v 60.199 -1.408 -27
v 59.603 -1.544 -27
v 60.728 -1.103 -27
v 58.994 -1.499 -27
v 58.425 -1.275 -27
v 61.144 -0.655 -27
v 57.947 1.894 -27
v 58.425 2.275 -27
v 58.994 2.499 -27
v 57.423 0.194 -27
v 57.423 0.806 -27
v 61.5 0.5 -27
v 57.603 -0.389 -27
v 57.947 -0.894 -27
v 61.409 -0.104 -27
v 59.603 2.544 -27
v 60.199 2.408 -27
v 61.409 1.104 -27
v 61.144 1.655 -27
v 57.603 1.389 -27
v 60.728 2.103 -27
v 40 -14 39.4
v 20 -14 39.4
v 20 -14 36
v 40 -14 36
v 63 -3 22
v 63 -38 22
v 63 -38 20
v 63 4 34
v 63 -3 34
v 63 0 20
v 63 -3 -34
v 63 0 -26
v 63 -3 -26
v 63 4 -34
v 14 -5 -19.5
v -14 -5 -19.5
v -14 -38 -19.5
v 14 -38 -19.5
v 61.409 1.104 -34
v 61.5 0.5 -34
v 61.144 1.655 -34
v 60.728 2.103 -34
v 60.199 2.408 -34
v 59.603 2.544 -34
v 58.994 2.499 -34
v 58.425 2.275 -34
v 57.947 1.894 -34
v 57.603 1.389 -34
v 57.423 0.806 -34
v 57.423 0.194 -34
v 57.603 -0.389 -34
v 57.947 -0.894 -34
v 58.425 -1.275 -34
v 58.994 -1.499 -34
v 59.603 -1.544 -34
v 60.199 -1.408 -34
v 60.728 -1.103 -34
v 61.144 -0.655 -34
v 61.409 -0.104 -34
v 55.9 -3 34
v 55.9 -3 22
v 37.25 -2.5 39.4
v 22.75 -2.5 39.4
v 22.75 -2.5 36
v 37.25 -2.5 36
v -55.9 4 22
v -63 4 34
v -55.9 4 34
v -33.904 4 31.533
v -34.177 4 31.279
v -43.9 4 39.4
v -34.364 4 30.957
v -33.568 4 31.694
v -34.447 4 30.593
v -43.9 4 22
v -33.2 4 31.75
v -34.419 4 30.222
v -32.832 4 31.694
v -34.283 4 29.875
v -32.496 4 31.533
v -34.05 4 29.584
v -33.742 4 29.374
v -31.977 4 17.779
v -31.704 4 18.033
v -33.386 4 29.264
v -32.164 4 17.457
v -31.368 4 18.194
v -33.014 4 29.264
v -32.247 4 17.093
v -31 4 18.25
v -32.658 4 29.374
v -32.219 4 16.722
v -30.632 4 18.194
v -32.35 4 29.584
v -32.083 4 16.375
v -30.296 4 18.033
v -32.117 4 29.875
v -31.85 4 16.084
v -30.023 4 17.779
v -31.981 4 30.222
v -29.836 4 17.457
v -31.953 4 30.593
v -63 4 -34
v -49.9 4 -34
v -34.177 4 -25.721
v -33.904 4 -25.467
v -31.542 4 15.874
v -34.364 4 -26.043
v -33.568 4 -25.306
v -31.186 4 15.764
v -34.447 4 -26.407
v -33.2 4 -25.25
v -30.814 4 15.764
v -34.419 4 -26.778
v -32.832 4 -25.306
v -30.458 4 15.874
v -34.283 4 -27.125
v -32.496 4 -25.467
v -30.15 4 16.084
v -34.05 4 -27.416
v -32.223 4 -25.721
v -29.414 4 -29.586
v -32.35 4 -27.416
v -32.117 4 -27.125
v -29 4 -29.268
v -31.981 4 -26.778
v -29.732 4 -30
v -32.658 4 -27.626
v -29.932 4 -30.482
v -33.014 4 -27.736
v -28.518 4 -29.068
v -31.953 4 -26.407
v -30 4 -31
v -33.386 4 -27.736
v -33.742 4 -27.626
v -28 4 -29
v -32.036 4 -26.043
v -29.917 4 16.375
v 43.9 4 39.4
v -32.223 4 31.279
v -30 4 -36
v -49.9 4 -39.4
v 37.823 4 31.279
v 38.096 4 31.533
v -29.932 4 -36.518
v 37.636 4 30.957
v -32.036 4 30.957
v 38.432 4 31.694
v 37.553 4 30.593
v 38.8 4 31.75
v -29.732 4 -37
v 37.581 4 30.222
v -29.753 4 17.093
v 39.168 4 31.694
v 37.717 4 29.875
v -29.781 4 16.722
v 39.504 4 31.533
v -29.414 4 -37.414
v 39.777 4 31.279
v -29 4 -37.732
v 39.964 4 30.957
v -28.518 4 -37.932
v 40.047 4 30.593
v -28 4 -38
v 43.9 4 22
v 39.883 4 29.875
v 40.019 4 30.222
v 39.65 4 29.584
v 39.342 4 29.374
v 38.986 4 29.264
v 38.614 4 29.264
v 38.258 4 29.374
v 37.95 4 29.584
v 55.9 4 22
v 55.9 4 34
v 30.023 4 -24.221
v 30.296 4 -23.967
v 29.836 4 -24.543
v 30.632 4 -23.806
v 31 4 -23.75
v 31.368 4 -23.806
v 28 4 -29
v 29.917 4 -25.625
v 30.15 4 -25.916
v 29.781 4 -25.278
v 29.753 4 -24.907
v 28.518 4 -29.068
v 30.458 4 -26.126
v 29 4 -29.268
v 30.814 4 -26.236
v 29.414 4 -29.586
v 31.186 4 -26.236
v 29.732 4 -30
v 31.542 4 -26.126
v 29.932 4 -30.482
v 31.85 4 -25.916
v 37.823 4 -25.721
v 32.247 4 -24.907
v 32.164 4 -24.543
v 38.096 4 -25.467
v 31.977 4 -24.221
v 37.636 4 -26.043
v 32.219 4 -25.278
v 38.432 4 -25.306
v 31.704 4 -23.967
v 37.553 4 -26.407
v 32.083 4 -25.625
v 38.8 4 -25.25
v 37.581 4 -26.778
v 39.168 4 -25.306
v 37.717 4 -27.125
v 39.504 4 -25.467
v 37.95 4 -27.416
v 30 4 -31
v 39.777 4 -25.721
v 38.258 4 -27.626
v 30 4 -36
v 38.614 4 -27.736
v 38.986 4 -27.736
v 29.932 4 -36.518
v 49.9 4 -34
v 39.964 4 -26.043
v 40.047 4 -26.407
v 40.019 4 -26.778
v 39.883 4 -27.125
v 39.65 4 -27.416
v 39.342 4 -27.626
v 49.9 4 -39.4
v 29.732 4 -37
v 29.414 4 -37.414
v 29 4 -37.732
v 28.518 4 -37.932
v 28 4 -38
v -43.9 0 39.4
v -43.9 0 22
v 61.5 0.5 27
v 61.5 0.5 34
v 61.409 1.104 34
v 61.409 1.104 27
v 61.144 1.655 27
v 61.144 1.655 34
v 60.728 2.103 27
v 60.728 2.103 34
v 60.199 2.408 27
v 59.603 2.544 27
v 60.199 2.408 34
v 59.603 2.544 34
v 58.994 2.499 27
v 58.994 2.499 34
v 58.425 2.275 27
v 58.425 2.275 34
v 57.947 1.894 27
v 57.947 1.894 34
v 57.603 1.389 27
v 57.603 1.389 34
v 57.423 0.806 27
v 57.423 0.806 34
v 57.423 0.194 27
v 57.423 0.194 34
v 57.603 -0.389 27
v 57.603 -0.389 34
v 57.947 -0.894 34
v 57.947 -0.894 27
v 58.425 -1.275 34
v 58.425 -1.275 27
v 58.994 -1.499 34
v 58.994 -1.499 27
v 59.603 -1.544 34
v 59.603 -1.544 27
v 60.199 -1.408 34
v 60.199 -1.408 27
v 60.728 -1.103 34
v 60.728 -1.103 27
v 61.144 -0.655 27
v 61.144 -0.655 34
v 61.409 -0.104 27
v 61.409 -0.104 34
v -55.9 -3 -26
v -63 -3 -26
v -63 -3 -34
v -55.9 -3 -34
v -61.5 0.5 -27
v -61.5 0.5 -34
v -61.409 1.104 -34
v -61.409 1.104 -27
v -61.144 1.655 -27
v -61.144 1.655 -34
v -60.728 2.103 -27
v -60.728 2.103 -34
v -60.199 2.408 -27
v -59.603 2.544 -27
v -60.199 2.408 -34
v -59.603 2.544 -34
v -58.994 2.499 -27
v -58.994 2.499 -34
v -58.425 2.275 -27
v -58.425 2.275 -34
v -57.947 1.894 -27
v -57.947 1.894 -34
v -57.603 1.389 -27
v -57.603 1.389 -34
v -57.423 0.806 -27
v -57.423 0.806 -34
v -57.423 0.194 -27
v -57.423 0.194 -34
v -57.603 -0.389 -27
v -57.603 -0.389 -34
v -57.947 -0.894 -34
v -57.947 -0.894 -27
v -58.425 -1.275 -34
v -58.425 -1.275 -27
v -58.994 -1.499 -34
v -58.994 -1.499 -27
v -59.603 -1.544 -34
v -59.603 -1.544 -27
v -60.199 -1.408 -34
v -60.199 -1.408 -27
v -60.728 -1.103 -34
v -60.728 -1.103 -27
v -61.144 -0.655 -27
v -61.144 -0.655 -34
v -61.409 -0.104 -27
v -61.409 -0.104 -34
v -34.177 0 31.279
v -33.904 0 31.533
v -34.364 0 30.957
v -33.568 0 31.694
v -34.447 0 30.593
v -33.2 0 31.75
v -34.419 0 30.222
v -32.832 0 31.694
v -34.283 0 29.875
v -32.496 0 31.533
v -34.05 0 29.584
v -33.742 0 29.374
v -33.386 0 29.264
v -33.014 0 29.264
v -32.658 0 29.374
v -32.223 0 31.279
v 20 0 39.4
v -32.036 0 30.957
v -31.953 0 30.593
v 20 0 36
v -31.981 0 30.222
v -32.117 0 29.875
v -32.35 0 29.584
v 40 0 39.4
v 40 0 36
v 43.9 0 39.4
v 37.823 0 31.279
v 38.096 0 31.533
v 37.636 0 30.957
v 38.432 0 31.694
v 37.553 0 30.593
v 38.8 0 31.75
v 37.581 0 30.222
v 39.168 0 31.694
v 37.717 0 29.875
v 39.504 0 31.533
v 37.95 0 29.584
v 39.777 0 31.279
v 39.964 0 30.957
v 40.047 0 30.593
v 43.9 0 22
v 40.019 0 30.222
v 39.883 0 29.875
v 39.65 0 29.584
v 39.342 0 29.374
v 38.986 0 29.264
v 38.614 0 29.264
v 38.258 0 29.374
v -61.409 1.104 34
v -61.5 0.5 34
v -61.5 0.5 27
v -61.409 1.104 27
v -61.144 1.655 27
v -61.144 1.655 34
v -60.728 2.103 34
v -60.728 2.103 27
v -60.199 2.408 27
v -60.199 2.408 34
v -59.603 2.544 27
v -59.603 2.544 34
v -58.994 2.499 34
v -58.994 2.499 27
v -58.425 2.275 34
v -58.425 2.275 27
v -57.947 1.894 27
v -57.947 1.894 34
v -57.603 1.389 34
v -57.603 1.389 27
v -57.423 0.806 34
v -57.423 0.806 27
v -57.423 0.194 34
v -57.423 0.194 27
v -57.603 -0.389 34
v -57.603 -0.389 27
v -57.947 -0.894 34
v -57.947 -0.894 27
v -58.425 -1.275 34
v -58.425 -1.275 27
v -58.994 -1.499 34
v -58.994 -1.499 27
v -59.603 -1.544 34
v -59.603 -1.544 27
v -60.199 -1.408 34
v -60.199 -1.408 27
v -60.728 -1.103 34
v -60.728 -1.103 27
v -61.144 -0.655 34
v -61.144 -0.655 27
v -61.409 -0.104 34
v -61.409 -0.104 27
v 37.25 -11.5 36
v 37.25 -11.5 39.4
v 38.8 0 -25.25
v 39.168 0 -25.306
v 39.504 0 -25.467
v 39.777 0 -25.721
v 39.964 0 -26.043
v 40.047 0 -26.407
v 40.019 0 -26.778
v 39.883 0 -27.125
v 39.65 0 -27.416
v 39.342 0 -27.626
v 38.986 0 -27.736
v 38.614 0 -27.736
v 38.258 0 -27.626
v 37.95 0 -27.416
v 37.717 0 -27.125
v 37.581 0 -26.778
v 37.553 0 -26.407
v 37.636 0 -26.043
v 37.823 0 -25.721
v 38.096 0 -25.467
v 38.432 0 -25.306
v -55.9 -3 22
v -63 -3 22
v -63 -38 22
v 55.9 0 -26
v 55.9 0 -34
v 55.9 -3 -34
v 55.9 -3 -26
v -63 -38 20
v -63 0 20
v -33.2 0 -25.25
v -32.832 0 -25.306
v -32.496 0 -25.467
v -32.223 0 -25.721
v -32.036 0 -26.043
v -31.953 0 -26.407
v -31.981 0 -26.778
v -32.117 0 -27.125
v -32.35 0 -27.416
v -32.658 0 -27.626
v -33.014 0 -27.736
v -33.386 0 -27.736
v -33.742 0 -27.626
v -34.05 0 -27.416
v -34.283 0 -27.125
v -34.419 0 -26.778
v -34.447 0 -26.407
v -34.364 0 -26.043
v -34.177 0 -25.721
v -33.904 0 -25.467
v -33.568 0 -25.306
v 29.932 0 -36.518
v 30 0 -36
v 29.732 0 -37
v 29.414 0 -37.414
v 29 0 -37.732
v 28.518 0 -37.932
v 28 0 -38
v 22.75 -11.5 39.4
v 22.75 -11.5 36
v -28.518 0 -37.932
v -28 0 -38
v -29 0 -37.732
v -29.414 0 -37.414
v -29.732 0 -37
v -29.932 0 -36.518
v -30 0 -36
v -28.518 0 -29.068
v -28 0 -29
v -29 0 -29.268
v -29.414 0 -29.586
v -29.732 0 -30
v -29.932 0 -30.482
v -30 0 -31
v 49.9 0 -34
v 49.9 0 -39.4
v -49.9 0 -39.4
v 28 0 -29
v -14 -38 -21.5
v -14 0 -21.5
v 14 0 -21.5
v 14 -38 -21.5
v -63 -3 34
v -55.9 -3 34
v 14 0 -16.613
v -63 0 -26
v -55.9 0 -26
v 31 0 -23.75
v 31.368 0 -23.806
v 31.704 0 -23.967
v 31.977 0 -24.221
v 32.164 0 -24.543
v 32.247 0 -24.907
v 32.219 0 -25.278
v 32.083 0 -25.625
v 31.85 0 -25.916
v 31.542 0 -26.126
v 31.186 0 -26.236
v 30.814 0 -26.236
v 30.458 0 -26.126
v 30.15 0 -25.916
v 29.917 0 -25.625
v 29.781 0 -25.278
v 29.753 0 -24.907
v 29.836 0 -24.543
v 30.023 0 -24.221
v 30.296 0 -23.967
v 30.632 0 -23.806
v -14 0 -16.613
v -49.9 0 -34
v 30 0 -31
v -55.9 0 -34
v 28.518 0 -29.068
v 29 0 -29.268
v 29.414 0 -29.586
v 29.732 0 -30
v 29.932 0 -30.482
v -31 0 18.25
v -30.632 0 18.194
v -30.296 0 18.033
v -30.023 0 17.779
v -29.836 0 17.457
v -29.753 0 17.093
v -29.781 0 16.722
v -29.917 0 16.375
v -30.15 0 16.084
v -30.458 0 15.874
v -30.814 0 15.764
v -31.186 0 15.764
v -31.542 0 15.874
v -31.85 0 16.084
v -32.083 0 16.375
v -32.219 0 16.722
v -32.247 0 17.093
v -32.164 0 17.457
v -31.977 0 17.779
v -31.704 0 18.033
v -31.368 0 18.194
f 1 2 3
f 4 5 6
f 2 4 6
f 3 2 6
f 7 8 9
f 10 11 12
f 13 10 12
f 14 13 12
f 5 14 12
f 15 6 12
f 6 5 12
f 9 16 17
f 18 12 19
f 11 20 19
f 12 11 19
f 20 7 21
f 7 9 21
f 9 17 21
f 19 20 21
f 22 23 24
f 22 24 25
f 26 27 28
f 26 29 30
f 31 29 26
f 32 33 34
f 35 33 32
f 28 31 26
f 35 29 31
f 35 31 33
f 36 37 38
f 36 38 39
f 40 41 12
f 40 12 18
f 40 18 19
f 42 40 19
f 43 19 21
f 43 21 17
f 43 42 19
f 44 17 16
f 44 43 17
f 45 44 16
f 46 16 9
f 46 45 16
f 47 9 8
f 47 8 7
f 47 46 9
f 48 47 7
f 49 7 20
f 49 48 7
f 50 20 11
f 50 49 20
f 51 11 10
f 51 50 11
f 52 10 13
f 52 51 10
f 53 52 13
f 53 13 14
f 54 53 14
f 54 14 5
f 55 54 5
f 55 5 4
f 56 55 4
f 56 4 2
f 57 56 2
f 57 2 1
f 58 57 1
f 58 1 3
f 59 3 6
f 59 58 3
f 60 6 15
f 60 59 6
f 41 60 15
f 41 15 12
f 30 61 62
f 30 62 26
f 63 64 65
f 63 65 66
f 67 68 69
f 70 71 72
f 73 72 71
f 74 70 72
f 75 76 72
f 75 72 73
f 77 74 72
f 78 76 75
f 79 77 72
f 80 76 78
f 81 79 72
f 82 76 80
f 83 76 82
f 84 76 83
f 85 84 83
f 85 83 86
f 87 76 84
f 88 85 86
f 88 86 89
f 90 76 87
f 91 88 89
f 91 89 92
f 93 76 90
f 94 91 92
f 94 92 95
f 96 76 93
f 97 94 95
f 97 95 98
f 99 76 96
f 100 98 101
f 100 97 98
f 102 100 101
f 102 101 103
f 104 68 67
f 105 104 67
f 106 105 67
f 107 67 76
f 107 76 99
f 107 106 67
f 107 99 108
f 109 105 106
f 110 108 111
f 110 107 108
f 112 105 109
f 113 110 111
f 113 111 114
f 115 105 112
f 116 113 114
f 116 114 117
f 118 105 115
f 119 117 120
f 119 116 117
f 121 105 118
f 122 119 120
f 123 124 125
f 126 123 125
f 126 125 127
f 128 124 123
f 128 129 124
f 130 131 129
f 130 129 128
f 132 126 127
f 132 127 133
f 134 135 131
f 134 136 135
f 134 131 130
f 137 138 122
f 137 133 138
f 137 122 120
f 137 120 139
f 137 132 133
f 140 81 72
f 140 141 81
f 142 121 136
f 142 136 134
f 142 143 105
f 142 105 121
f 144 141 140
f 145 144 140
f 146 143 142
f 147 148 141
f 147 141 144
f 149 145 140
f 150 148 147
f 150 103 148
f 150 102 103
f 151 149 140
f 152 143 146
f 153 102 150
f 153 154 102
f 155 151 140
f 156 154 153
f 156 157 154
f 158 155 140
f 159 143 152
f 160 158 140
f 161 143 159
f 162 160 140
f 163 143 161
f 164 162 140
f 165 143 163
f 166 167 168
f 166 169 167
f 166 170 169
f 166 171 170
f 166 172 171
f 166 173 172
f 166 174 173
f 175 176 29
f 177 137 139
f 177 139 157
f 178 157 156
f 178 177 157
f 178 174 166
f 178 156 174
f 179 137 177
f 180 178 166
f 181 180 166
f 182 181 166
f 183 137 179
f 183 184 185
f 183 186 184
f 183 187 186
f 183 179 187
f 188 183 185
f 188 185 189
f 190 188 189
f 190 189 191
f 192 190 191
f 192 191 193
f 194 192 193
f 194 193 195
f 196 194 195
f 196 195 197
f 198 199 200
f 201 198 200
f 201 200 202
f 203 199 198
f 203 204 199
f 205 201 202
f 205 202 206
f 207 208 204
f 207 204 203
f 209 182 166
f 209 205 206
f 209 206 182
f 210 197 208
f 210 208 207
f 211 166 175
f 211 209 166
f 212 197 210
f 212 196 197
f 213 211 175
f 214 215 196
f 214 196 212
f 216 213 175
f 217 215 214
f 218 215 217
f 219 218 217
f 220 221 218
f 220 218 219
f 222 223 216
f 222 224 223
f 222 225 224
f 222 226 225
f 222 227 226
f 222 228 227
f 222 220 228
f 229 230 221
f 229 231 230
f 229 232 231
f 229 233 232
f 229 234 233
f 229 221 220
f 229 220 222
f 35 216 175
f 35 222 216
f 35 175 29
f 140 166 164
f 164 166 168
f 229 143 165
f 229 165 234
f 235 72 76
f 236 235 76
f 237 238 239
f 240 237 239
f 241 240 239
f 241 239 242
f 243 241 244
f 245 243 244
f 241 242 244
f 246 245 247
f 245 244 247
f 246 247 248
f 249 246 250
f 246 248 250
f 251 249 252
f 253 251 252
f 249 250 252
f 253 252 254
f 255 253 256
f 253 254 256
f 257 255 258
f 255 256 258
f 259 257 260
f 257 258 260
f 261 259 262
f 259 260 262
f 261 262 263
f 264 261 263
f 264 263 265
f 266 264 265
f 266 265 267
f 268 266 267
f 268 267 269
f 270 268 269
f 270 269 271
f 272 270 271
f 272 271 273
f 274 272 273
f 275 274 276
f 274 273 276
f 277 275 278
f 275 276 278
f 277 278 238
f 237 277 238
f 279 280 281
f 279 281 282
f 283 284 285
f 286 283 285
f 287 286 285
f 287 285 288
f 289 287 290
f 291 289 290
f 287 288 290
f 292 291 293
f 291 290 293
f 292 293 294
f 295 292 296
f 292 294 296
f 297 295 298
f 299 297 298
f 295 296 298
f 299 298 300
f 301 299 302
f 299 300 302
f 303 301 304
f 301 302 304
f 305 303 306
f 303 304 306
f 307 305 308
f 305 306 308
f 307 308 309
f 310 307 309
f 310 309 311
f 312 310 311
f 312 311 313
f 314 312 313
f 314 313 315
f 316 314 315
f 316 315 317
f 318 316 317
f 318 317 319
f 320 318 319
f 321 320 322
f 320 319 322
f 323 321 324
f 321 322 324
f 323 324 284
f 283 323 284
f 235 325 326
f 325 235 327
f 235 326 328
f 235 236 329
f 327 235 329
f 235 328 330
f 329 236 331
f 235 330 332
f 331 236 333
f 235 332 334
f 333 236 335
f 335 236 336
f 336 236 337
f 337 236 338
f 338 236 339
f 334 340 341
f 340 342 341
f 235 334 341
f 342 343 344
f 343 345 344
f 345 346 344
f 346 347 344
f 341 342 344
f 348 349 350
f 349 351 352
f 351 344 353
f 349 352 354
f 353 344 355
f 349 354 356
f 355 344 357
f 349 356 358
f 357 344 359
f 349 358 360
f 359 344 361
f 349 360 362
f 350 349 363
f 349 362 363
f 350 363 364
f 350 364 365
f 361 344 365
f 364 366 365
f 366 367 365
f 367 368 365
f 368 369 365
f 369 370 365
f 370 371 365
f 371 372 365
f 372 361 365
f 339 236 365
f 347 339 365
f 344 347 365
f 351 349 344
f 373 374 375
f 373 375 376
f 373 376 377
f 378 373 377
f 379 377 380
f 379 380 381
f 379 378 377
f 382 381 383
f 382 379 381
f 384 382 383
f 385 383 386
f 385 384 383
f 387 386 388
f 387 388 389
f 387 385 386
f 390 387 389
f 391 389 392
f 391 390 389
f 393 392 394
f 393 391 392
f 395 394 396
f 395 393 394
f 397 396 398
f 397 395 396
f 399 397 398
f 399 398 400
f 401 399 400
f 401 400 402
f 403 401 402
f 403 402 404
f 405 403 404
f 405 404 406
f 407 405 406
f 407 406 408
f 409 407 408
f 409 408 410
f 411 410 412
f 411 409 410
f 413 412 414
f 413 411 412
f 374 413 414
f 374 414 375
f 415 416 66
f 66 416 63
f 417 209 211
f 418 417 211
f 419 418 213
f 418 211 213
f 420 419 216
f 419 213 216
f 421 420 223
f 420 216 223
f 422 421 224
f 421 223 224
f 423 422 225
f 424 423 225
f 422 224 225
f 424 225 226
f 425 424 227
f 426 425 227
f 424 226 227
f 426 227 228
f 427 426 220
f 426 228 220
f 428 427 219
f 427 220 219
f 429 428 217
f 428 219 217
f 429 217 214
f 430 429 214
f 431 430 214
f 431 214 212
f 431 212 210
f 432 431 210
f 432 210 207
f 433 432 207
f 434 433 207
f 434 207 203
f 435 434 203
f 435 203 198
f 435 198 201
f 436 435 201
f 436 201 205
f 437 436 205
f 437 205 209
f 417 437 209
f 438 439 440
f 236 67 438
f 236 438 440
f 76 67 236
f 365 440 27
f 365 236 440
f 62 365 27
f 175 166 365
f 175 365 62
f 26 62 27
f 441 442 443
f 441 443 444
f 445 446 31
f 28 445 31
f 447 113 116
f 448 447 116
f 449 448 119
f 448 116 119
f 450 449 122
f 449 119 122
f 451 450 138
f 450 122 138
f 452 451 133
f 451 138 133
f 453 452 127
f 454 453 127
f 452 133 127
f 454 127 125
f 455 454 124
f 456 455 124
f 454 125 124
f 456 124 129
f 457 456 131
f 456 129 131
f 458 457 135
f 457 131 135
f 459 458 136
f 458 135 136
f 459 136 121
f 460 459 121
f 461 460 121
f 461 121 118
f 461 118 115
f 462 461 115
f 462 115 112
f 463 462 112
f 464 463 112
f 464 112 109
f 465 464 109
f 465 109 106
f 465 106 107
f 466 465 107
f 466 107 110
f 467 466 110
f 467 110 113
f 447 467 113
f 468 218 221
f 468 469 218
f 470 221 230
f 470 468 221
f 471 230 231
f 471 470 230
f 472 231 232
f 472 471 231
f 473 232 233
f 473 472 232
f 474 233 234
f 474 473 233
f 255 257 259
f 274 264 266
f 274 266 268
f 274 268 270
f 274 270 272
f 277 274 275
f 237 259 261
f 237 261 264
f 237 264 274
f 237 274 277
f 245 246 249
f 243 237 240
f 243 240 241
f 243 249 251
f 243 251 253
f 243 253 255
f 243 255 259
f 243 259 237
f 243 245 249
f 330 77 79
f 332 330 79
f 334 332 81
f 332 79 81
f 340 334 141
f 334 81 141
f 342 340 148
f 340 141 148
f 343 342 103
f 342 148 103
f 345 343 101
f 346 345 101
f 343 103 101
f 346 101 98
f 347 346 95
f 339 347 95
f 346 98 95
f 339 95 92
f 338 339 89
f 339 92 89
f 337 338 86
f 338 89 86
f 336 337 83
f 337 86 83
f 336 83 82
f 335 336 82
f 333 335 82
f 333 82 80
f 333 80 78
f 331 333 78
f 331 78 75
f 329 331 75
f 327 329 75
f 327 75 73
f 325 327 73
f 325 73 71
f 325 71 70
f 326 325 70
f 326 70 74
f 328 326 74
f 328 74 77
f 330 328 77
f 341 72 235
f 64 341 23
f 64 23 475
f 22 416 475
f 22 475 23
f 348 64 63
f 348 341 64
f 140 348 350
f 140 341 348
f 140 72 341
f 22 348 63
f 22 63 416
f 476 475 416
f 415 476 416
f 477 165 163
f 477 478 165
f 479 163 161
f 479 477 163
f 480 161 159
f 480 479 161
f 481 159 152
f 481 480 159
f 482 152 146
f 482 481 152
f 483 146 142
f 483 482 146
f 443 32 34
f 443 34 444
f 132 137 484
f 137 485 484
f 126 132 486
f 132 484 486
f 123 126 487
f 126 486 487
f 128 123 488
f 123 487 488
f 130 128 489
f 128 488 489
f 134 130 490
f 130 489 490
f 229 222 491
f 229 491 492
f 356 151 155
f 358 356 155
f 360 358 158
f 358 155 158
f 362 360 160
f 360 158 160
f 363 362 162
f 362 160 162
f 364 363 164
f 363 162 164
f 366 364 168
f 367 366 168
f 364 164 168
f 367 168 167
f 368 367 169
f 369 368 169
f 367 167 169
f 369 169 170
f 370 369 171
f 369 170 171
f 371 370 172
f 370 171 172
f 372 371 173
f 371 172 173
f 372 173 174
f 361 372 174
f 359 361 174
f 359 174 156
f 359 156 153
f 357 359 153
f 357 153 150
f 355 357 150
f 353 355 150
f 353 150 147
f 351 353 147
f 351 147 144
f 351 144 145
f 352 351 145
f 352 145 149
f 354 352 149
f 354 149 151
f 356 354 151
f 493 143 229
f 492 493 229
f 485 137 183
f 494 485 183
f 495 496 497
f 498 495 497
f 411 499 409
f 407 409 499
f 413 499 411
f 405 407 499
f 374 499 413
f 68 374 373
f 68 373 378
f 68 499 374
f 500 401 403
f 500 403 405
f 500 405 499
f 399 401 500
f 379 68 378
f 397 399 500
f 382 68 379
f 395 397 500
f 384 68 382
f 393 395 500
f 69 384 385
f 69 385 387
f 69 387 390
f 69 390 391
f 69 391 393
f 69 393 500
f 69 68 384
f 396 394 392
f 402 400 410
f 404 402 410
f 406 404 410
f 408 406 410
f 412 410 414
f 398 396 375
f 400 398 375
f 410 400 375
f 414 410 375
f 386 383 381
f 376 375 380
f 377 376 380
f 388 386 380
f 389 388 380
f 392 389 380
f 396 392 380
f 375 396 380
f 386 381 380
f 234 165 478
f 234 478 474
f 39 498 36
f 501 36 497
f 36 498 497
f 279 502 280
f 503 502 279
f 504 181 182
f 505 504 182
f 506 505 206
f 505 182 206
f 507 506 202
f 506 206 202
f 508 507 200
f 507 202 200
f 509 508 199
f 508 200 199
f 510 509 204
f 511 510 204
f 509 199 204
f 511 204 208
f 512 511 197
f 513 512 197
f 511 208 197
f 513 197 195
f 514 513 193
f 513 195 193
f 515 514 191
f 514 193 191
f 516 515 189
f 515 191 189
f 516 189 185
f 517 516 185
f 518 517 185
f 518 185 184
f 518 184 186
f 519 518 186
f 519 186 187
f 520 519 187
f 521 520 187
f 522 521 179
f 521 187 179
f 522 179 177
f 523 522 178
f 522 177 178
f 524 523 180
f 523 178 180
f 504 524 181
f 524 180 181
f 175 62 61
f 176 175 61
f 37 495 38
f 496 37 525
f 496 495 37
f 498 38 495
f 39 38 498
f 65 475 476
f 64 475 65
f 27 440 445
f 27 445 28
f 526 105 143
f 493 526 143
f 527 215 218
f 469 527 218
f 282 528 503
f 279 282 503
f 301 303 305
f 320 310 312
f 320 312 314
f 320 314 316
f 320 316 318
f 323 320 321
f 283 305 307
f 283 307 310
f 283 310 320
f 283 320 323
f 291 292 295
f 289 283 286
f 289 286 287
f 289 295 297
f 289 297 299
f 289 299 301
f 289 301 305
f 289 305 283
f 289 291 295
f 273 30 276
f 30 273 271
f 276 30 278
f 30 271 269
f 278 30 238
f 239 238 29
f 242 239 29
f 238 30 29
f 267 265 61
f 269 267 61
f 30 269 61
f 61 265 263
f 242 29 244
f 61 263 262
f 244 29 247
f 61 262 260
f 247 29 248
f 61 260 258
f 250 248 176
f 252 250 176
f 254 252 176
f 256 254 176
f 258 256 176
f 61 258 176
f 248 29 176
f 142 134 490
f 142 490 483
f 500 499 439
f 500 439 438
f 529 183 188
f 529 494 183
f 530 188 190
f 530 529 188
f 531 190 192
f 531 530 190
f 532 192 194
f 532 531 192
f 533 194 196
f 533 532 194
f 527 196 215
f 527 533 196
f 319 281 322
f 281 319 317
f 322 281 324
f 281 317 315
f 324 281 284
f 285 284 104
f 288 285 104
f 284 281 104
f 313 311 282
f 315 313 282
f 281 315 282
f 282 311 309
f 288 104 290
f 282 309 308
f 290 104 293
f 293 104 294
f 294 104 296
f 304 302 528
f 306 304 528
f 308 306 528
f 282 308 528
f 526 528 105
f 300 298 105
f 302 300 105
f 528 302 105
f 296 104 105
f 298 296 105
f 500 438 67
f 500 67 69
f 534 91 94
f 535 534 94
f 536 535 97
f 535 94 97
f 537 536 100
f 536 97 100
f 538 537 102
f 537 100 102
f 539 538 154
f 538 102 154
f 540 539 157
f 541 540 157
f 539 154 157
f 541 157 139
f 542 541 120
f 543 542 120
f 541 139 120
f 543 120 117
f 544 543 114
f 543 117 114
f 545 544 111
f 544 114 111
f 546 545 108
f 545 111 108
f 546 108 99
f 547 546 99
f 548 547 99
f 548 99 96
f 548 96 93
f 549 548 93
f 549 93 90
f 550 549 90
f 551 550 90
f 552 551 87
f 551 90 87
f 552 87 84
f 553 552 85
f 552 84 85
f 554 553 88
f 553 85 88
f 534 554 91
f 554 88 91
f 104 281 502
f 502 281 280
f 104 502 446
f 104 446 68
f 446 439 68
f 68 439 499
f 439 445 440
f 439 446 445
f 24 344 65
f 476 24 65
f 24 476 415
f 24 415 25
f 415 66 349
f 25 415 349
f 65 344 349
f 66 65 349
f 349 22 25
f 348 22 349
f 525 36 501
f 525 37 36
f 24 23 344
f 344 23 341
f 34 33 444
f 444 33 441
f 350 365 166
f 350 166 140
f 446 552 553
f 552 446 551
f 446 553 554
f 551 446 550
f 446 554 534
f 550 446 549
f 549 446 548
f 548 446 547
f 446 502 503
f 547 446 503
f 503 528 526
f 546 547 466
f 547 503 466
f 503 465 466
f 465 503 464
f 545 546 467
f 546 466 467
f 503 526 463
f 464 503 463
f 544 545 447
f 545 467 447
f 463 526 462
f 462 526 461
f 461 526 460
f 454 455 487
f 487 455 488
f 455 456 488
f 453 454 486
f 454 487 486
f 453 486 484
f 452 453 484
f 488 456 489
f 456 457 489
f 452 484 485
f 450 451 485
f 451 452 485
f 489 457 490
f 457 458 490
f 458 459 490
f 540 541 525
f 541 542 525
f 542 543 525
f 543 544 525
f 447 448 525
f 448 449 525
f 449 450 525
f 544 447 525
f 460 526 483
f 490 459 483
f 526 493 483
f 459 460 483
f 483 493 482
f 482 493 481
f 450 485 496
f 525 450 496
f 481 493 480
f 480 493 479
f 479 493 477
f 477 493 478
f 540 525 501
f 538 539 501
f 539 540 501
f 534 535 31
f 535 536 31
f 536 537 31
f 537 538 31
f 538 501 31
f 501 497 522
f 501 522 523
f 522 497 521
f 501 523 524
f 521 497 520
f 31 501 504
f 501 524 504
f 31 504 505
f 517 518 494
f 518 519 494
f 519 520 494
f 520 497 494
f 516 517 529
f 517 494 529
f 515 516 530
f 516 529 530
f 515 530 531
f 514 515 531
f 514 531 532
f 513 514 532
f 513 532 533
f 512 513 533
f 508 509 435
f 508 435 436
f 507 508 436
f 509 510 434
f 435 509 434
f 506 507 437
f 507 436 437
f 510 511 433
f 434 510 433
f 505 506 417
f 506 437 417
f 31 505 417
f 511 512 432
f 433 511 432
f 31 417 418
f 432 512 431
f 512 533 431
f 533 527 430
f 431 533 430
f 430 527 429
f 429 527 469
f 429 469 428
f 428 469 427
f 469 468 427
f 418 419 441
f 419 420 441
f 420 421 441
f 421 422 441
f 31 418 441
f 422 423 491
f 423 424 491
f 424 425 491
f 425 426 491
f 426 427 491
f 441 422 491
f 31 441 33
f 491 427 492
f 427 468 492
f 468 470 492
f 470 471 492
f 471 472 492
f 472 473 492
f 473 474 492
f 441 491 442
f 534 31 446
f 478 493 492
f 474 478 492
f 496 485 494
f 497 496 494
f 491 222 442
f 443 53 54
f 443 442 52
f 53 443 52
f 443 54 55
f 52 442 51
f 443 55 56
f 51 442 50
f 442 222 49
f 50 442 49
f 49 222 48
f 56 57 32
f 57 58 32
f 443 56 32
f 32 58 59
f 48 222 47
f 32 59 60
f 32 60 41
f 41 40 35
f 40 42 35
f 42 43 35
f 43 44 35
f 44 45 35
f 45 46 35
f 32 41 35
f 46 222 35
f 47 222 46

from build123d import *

# Parameters (mm, degrees)
BOSS_EXTRUDE1_DEPTH             = 4
SKETCH3_W                       = 7.1
SKETCH3_H                       = 8
BOSS_EXTRUDE3_DEPTH             = 3
SKETCH4_R                       = 2.05
CUT_EXTRUDE1_DEPTH              = 7
MIRROR2_COPY_1_SKETCH_W         = 7.1
MIRROR2_COPY_1_SKETCH_H         = 8
MIRROR2_COPY_1_DEPTH            = 3
MIRROR2_COPY_2_SKETCH_R         = 2.05
MIRROR2_COPY_2_DEPTH            = 7
SKETCH5_W                       = 60
SKETCH5_H                       = 9
CUT_EXTRUDE2_DEPTH              = 76.4917214
FILLET1_R                       = 2
SKETCH7_W                       = 111.8
SKETCH7_H                       = 1
CUT_EXTRUDE3_DEPTH              = 76.4917214
SKETCH8_W                       = 126
SKETCH8_H                       = 2
BOSS_EXTRUDE4_DEPTH             = 38
SKETCH9_W                       = 12
SKETCH9_H                       = 18
CUT_EXTRUDE4_DEPTH              = 10
SKETCH10_W                      = 7.1
SKETCH10_H                      = 4
BOSS_EXTRUDE5_DEPTH             = 3
SKETCH12_W                      = 1.5
SKETCH12_H                      = 4
BOSS_EXTRUDE6_DEPTH             = 2
SKETCH13_W                      = 40
SKETCH13_H                      = 2
BOSS_EXTRUDE7_DEPTH             = 38
SKETCH14_W                      = 1.5
SKETCH14_H                      = 4
BOSS_EXTRUDE8_DEPTH             = 1
BOSS_EXTRUDE9_REACH             = 85.744
BOSS_EXTRUDE9_DIRECTION_2_REACH = 85.744
SKETCH16_W                      = 20
SKETCH16_H                      = 14
SKETCH16_W_2                    = 14.5
SKETCH16_H_2                    = 9
BOSS_EXTRUDE10_DEPTH            = 4
SKETCH17_W                      = 12
SKETCH17_H                      = 18
CUT_EXTRUDE5_DEPTH              = 84.743656476
SKETCH18_W                      = 6
SKETCH18_H                      = 6
CUT_EXTRUDE6_DEPTH              = 86.632937588
SKETCH22_R                      = 1.25
CUT_EXTRUDE7_DEPTH              = 4
SKETCH25_W                      = 6
SKETCH25_H                      = 38
CUT_EXTRUDE11_DEPTH             = 10
SKETCH26_W                      = 5.701552738
SKETCH26_H                      = 30.562488548
SKETCH26_W_2                    = 6.53419365
SKETCH26_H_2                    = 28.524331859
CUT_EXTRUDE12_DEPTH             = 85.498520697
CUT_EXTRUDE12_DEPTH_BACK        = 85.498520697
SKETCH27_R                      = 1.25
CUT_EXTRUDE13_DEPTH             = 86.632937588
SKETCH28_W                      = 99.8
SKETCH28_H                      = 0.6
SKETCH28_W_2                    = 87.8
CUT_EXTRUDE14_DEPTH             = 86.632937588


with BuildPart() as part:
    # Sketch1 → Boss-Extrude1 (new body)
    with BuildSketch(Plane(origin=(0, 0, 0), x_dir=(1, 0, 0), z_dir=(0, 1, 0))):
        Polygon((-63, -34), (-55.9, -34), (-55.9, -41), (55.9, -41), (55.9, -34), (63, -34), (63, 34), (55.9, 34), (55.9, 41), (-55.9, 41), (-55.9, 34), (-63, 34), align=None)
    extrude(amount=BOSS_EXTRUDE1_DEPTH)

    # Sketch3 → Boss-Extrude3 (add)
    with BuildSketch(Plane.XZ):
        with Locations((-59.45, -30)):
            Rectangle(SKETCH3_W, SKETCH3_H)
    boss_extrude3 = extrude(amount=BOSS_EXTRUDE3_DEPTH)

    # Sketch4 → Cut-Extrude1 (cut)
    with BuildSketch(Plane(origin=(0, 0, -34), x_dir=(-1, 0, 0), z_dir=(0, 0, -1))):
        with Locations((59.45, 0.5)):
            Circle(SKETCH4_R)
    cut_extrude1 = extrude(amount=-CUT_EXTRUDE1_DEPTH, mode=Mode.SUBTRACT)

    # Mirror1: Boss-Extrude3, Cut-Extrude1 across plane
    add(boss_extrude3.mirror(Plane(origin=(0, 0, 0), x_dir=(0, 0, 1), z_dir=(1, 0, 0))))
    add(cut_extrude1.mirror(Plane(origin=(0, 0, 0), x_dir=(0, 0, 1), z_dir=(1, 0, 0))), mode=Mode.SUBTRACT)

    # Mirror2: Boss-Extrude3, Cut-Extrude1 across plane
    add(boss_extrude3.mirror(Plane.XY))
    add(cut_extrude1.mirror(Plane.XY), mode=Mode.SUBTRACT)

    # Mirror2 copy 1 sketch → Mirror2 copy 1 (add)
    with BuildSketch(Plane(origin=(0, 0, 0), x_dir=(-1, 0, 0), z_dir=(0, -1, 0))):
        with Locations((-59.45, -30)):
            Rectangle(MIRROR2_COPY_1_SKETCH_W, MIRROR2_COPY_1_SKETCH_H)
    extrude(amount=MIRROR2_COPY_1_DEPTH)

    # Mirror2 copy 2 sketch → Mirror2 copy 2 (cut)
    with BuildSketch(Plane.XY.offset(34)):
        with Locations((59.45, 0.5)):
            Circle(MIRROR2_COPY_2_SKETCH_R)
    extrude(amount=-MIRROR2_COPY_2_DEPTH, mode=Mode.SUBTRACT)

    # Sketch5 → Cut-Extrude2 (cut, through all)
    with BuildSketch(Plane(origin=(0, 4, 0), x_dir=(1, 0, 0), z_dir=(0, 1, 0))):
        with Locations((0, 33.5)):
            Rectangle(SKETCH5_W, SKETCH5_H)
    extrude(amount=-CUT_EXTRUDE2_DEPTH, mode=Mode.SUBTRACT)

    # Fillet1
    fillet1_edges = [part.edges().sort_by_distance(p)[0] for p in [
        (-30, 2, -29),
        (-30, 2, -38),
        (30, 2, -38),
        (30, 2, -29),
    ]]
    fillet(fillet1_edges, radius=FILLET1_R)

    # Sketch7 → Cut-Extrude3 (cut, through all)
    with BuildSketch(Plane(origin=(0, 4, 0), x_dir=(1, 0, 0), z_dir=(0, 1, 0))):
        with Locations((0, 40.5)):
            Rectangle(SKETCH7_W, SKETCH7_H)
        with Locations((0, -40.5)):
            Rectangle(SKETCH7_W, SKETCH7_H)
    extrude(amount=-CUT_EXTRUDE3_DEPTH, mode=Mode.SUBTRACT)

    # Sketch8 → Boss-Extrude4 (add)
    with BuildSketch(Plane.XZ):
        with Locations((0, 21)):
            Rectangle(SKETCH8_W, SKETCH8_H)
    extrude(amount=BOSS_EXTRUDE4_DEPTH)

    # Sketch9 → Cut-Extrude4 (cut)
    with BuildSketch(Plane(origin=(0, 4, 0), x_dir=(1, 0, 0), z_dir=(0, 1, 0))):
        with Locations((-49.9, -31)):
            Rectangle(SKETCH9_W, SKETCH9_H)
    extrude(amount=-CUT_EXTRUDE4_DEPTH, mode=Mode.SUBTRACT)

    # Sketch10 → Boss-Extrude5 (add)
    with BuildSketch(Plane.XZ.offset(3)):
        with Locations((-59.45, 24)):
            Rectangle(SKETCH10_W, SKETCH10_H)
        with Locations((59.45, 24)):
            Rectangle(SKETCH10_W, SKETCH10_H)
    extrude(amount=-BOSS_EXTRUDE5_DEPTH)

    # Sketch12 → Boss-Extrude6 (add)
    with BuildSketch(Plane.ZY.offset(56)):
        Polygon((22, -5.8), (22, -16.2), (24.7, -13.5), (24.7, -8.5), align=None)
        with Locations((23.35, -11)):
            Rectangle(SKETCH12_W, SKETCH12_H, mode=Mode.SUBTRACT)
        Polygon((22, -20.8), (22, -31.2), (24.7, -28.5), (24.7, -23.5), align=None)
        with Locations((23.35, -26)):
            Rectangle(SKETCH12_W, SKETCH12_H, mode=Mode.SUBTRACT)
    boss_extrude6 = extrude(amount=-BOSS_EXTRUDE6_DEPTH)

    # Mirror3: Boss-Extrude6 across plane
    add(boss_extrude6.mirror(Plane(origin=(-49.9, 0, 0), x_dir=(0, 0, 1), z_dir=(1, 0, 0))))

    # Sketch13 → Boss-Extrude7 (add)
    with BuildSketch(Plane.XZ):
        with Locations((0, -20.5)):
            Rectangle(SKETCH13_W, SKETCH13_H)
    extrude(amount=BOSS_EXTRUDE7_DEPTH)

    # Sketch14 → Boss-Extrude8 (add, symmetric)
    with BuildSketch(Plane(origin=(0, 0, 0), x_dir=(0, 0, -1), z_dir=(1, 0, 0))):
        Polygon((24.2, -8.5), (21.5, -5.8), (21.5, -16.2), (24.2, -13.5), align=None)
        with Locations((22.85, -11)):
            Rectangle(SKETCH14_W, SKETCH14_H, mode=Mode.SUBTRACT)
        Polygon((24.2, -28.5), (24.2, -23.5), (21.5, -20.8), (21.5, -31.2), align=None)
        with Locations((22.85, -26)):
            Rectangle(SKETCH14_W, SKETCH14_H, mode=Mode.SUBTRACT)
    extrude(amount=BOSS_EXTRUDE8_DEPTH, both=True)

    # Boss-Extrude9: up to this face of the body (flat: up to its plane)
    boss_extrude9_end = Plane(part.part.faces().sort_by_distance((-20, -19, -20.5))[0])
    # Sketch15 → Boss-Extrude9 (add, up to the picked face)
    with BuildSketch(Plane(origin=(0, 0, 0), x_dir=(0, 0, -1), z_dir=(1, 0, 0)), mode=Mode.PRIVATE) as boss_extrude9_sk1:
        Polygon((19.5, 0), (19.5, -5), (16.613248654, 0), align=None)
    boss_extrude9_tool1 = split(extrude(boss_extrude9_sk1.sketch, amount=-BOSS_EXTRUDE9_REACH, mode=Mode.PRIVATE), bisect_by=boss_extrude9_end, keep=Keep.BOTH, mode=Mode.PRIVATE)
    add(boss_extrude9_tool1.solids().sort_by(Axis((0, -1.666667, -18.53775), (-1, 0, 0)))[0])

    # Boss-Extrude9 direction 2: up to this face of the body (flat: up to its plane)
    boss_extrude9_direction_2_end = Plane(part.part.faces().sort_by_distance((20, -19, -20.5))[0])
    # Sketch15 → Boss-Extrude9 direction 2 (add, up to the picked face)
    with BuildSketch(Plane(origin=(0, 0, 0), x_dir=(0, 0, -1), z_dir=(1, 0, 0)), mode=Mode.PRIVATE) as boss_extrude9_direction_2_sk1:
        Polygon((19.5, 0), (19.5, -5), (16.613248654, 0), align=None)
    boss_extrude9_direction_2_tool1 = split(extrude(boss_extrude9_direction_2_sk1.sketch, amount=BOSS_EXTRUDE9_DIRECTION_2_REACH, mode=Mode.PRIVATE), bisect_by=boss_extrude9_direction_2_end, keep=Keep.BOTH, mode=Mode.PRIVATE)
    add(boss_extrude9_direction_2_tool1.solids().sort_by(Axis((0, -1.666667, -18.53775), (1, 0, 0)))[0])

    # Sketch16 → Boss-Extrude10 (add)
    with BuildSketch(Plane.XY.offset(40)):
        with Locations((30, -7)):
            Rectangle(SKETCH16_W, SKETCH16_H)
        with Locations((30, -7)):
            Rectangle(SKETCH16_W_2, SKETCH16_H_2, mode=Mode.SUBTRACT)
    extrude(amount=-BOSS_EXTRUDE10_DEPTH)

    # Sketch17 → Cut-Extrude5 (cut, through all)
    with BuildSketch(Plane.XZ):
        with Locations((49.9, 31)):
            Rectangle(SKETCH17_W, SKETCH17_H)
    extrude(amount=-CUT_EXTRUDE5_DEPTH, mode=Mode.SUBTRACT)

    # Sketch18 → Cut-Extrude6 (cut, through all)
    with BuildSketch(Plane(origin=(0, 4, 0), x_dir=(1, 0, 0), z_dir=(0, 1, 0))):
        with Locations((52.9, 37)):
            Rectangle(SKETCH18_W, SKETCH18_H)
        with Locations((-52.9, 37)):
            Rectangle(SKETCH18_W, SKETCH18_H)
    extrude(amount=-CUT_EXTRUDE6_DEPTH, mode=Mode.SUBTRACT)

    # Sketch22 → Cut-Extrude7 (cut)
    with BuildSketch(Plane(origin=(0, 4, 0), x_dir=(1, 0, 0), z_dir=(0, 1, 0))):
        with Locations(Location((31, 25, 0), (0, 0, 270))):
            Circle(SKETCH22_R)
        with Locations(Location((-31, -17, 0), (0, 0, 270))):
            Circle(SKETCH22_R)
    extrude(amount=-CUT_EXTRUDE7_DEPTH, mode=Mode.SUBTRACT)

    # Sketch25 → Cut-Extrude11 (cut)
    with BuildSketch(Plane(origin=(0, 0, -21.5), x_dir=(-1, 0, 0), z_dir=(0, 0, -1))):
        with Locations((-17, -19)):
            Rectangle(SKETCH25_W, SKETCH25_H)
        with Locations((17, -19)):
            Rectangle(SKETCH25_W, SKETCH25_H)
    extrude(amount=-CUT_EXTRUDE11_DEPTH, mode=Mode.SUBTRACT)

    # Sketch26 → Cut-Extrude12 (cut, two sides)
    with BuildSketch(Plane.ZY.offset(1)) as cut_extrude12_sk:
        with Locations((-24.350776369, -21.081244274)):
            Rectangle(SKETCH26_W, SKETCH26_H)
        with Locations((25.267096825, -20.06216593)):
            Rectangle(SKETCH26_W_2, SKETCH26_H_2)
    extrude(amount=CUT_EXTRUDE12_DEPTH, mode=Mode.SUBTRACT)
    extrude(cut_extrude12_sk.sketch, amount=-CUT_EXTRUDE12_DEPTH_BACK, mode=Mode.SUBTRACT)

    # Sketch27 → Cut-Extrude13 (cut, through all)
    with BuildSketch(Plane(origin=(0, 4, 0), x_dir=(1, 0, 0), z_dir=(0, 1, 0))):
        with Locations(Location((-33.2, 26.5, 0), (0, 0, 270))):
            Circle(SKETCH27_R)
        with Locations(Location((-33.2, -30.5, 0), (0, 0, 270))):
            Circle(SKETCH27_R)
        with Locations(Location((38.8, -30.5, 0), (0, 0, 270))):
            Circle(SKETCH27_R)
        with Locations(Location((38.8, 26.5, 0), (0, 0, 270))):
            Circle(SKETCH27_R)
    extrude(amount=-CUT_EXTRUDE13_DEPTH, mode=Mode.SUBTRACT)

    # Sketch28 → Cut-Extrude14 (cut, through all)
    with BuildSketch(Plane(origin=(0, 4, 0), x_dir=(1, 0, 0), z_dir=(0, 1, 0))):
        with Locations((0, 39.7)):
            Rectangle(SKETCH28_W, SKETCH28_H)
        with Locations((0, -39.7)):
            Rectangle(SKETCH28_W_2, SKETCH28_H)
    extrude(amount=-CUT_EXTRUDE14_DEPTH, mode=Mode.SUBTRACT)


solid = part.part
